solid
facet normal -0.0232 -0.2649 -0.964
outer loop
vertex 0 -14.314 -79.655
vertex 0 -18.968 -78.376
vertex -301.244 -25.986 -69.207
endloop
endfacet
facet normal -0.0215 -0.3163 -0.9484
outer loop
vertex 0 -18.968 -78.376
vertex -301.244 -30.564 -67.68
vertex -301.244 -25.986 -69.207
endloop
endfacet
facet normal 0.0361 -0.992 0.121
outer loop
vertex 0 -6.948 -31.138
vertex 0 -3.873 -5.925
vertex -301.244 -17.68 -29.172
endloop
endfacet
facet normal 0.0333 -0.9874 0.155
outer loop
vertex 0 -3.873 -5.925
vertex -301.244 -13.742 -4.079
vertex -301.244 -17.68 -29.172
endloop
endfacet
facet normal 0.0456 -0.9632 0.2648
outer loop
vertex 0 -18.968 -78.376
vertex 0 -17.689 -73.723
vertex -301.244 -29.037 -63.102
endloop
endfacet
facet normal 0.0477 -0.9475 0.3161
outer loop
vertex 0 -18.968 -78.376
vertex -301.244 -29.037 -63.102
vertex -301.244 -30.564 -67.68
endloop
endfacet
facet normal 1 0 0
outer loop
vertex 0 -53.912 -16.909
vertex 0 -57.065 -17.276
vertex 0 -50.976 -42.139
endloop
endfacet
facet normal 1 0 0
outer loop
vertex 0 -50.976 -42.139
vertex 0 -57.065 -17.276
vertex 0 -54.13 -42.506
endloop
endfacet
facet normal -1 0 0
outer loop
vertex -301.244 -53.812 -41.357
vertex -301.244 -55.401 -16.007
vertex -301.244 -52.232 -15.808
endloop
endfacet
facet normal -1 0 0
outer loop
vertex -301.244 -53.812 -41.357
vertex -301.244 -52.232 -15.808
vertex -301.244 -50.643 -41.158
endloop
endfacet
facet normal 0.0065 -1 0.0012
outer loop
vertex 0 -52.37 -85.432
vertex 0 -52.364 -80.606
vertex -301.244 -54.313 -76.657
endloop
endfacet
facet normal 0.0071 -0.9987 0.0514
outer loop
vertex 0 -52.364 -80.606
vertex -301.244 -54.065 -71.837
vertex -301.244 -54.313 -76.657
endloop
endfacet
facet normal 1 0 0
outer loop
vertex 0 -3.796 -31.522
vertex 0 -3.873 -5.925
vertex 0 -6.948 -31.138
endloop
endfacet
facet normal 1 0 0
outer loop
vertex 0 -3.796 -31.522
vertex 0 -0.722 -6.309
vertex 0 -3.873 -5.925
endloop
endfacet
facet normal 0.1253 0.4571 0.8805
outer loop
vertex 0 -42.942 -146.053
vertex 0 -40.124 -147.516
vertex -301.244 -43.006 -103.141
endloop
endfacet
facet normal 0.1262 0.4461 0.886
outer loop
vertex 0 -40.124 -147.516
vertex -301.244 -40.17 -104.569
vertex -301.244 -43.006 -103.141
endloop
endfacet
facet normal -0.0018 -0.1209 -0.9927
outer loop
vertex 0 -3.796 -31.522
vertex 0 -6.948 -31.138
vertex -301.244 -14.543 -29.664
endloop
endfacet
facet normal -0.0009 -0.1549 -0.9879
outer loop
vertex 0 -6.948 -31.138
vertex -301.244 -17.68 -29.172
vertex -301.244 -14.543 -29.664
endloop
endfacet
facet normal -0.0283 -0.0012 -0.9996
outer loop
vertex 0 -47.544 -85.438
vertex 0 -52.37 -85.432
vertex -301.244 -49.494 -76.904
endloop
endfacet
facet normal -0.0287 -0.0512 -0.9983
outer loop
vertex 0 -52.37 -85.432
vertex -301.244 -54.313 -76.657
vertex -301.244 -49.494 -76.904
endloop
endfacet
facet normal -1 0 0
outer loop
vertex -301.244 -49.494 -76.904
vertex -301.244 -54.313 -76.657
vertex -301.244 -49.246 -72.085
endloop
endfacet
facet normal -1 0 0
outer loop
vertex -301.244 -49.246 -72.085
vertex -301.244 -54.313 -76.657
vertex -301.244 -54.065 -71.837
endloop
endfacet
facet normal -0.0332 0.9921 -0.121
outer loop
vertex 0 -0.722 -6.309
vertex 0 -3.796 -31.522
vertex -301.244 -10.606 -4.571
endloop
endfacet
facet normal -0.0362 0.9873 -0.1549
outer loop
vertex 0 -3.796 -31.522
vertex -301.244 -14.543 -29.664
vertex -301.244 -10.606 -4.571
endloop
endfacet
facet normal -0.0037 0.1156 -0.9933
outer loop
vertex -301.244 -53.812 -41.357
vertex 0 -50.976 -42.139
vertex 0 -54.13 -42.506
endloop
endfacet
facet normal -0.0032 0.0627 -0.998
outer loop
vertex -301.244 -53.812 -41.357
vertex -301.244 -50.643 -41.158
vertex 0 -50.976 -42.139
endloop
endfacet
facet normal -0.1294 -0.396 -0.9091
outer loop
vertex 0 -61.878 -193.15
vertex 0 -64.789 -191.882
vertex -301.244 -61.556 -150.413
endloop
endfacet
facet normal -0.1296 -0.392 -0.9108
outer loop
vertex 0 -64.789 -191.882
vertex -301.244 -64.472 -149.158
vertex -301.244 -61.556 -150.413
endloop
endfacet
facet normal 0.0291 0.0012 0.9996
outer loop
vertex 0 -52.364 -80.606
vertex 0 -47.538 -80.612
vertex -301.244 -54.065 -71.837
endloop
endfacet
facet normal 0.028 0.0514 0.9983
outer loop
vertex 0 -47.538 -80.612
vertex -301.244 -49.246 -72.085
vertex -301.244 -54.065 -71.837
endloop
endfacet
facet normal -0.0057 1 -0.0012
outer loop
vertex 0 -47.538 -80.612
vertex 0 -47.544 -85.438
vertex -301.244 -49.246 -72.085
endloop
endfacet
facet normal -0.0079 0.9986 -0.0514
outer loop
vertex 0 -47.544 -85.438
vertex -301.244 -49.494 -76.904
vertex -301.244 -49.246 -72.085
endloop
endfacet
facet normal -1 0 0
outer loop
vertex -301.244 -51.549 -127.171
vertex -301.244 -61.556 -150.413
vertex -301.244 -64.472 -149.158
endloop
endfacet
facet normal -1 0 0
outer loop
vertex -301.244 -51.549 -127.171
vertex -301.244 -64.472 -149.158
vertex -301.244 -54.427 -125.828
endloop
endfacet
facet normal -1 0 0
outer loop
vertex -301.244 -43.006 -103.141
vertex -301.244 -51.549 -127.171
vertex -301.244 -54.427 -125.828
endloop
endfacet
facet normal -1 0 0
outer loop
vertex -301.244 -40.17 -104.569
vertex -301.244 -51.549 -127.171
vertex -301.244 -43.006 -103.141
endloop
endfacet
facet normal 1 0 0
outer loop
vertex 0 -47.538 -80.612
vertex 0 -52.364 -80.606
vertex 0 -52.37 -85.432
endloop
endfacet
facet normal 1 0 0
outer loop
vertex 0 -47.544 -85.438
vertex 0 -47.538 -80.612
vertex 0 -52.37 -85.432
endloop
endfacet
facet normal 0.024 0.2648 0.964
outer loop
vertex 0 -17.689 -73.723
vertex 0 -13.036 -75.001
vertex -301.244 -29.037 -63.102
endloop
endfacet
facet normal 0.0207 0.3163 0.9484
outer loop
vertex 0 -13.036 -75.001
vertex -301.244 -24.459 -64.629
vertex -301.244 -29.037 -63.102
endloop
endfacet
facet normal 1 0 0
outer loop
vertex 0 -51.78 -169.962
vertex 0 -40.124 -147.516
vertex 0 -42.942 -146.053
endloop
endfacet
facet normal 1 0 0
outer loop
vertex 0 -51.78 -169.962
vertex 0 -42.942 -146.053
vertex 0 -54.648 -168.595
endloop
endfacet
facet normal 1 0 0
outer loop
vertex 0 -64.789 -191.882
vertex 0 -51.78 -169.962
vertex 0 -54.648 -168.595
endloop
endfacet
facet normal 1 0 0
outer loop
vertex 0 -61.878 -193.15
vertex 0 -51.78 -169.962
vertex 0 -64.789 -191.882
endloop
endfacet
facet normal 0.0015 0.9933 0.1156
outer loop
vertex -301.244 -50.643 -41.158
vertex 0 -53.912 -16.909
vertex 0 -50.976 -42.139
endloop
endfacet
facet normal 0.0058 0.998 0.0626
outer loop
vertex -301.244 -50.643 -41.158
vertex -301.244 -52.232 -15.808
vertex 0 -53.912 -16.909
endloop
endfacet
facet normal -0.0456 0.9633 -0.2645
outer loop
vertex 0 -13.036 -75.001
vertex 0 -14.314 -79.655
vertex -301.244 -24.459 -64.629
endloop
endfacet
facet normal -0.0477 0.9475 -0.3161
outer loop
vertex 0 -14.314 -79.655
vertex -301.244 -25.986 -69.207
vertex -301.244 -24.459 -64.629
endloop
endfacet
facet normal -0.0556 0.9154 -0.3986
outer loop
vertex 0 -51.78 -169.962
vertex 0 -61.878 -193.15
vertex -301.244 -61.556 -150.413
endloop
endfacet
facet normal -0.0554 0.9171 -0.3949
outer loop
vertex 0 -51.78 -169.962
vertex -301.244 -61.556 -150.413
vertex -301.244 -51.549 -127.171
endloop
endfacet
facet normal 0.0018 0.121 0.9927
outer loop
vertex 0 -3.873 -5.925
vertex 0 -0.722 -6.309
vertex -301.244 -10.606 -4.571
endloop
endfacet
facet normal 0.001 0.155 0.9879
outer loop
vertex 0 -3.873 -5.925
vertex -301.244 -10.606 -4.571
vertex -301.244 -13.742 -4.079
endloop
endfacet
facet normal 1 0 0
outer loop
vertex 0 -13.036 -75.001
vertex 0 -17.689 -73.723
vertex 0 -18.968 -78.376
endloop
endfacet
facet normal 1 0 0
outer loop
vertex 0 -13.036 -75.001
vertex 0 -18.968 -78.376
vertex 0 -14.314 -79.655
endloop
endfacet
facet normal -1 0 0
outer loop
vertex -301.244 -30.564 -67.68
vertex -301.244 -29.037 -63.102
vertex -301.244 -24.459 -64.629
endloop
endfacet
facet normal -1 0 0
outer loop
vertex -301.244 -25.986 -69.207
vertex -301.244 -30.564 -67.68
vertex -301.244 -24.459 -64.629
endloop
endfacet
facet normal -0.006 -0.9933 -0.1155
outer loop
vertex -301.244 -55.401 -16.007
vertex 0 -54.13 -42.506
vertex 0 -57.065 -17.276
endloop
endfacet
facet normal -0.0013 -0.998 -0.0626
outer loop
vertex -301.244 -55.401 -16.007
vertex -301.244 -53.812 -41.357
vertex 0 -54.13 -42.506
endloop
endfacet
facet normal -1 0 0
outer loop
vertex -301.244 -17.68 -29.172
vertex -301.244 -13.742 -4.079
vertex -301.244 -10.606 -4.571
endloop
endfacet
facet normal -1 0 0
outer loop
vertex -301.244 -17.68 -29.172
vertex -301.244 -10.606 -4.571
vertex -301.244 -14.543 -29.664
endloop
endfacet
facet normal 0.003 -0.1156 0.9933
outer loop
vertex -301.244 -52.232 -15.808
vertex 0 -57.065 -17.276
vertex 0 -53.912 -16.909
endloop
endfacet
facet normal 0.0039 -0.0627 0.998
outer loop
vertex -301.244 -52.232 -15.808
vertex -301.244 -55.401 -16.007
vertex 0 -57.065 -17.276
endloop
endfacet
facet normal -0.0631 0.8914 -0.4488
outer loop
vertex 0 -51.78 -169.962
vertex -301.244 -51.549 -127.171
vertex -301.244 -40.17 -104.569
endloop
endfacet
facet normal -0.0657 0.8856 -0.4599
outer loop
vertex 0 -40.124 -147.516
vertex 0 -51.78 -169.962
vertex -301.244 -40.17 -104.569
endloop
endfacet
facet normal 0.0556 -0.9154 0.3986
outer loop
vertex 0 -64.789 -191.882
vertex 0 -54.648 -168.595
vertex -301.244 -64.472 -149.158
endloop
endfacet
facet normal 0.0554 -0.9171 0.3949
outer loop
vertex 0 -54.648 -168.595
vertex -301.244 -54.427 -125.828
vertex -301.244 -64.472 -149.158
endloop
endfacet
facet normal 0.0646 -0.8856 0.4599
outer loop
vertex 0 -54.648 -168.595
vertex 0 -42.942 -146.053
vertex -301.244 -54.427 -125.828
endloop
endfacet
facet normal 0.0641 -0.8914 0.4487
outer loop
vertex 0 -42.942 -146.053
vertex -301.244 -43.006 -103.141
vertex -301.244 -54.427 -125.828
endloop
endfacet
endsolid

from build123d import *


with BuildPart() as part:
    # Sketch1 → Loft1 section 0
    with BuildSketch(Plane(origin=(0, 0, 0), x_dir=(0, 0, -1), z_dir=(1, 0, 0))):
        Polygon((5.924524399, -3.873191473), (31.13772874, -6.947980383), (31.522077354, -3.79632984), (6.308873012, -0.72154093), align=None)
    # Sketch2 → Loft1 section 1
    with BuildSketch(Plane(origin=(-301.244, 0, 0), x_dir=(0, 0, -1), z_dir=(1, 0, 0))):
        Polygon((29.66416581, -14.543476344), (4.571250508, -10.60576106), (4.079036097, -13.742375473), (29.171951399, -17.680090757), align=None)
    loft()


with BuildPart() as body_2:
    # Sketch1<3> → Loft2 section 0
    with BuildSketch(Plane(origin=(0, 0, 0), x_dir=(0, 0, -1), z_dir=(1, 0, 0))):
        Polygon((73.722592843, -17.689285792), (78.376128634, -18.967910303), (79.654753145, -14.314374511), (75.001217353, -13.035750001), align=None)
    # Sketch2<3> → Loft2 section 1
    with BuildSketch(Plane(origin=(-301.244, 0, 0), x_dir=(0, 0, -1), z_dir=(1, 0, 0))):
        Polygon((67.679850957, -30.564309841), (63.101919005, -29.03695427), (64.629274577, -24.459022317), (69.207206529, -25.986377889), align=None)
    loft()


with BuildPart() as body_3:
    # Sketch1<4> → Loft3 section 0
    with BuildSketch(Plane(origin=(0, 0, 0), x_dir=(0, 0, -1), z_dir=(1, 0, 0))):
        Polygon((146.053031758, -42.941582115), (168.594795862, -54.647515272), (170.058037507, -51.829794759), (147.516273403, -40.123861602), align=None)
    # Sketch2<4> → Loft3 section 1
    with BuildSketch(Plane(origin=(-301.244, 0, 0), x_dir=(0, 0, -1), z_dir=(1, 0, 0))):
        Polygon((125.828368959, -54.427320521), (103.140917658, -43.006306842), (104.568544368, -40.17037543), (127.255995669, -51.591389108), align=None)
    loft()

    # Sketch1<5> → Loft4 section 0
    with BuildSketch(Plane(origin=(0, 0, 0), x_dir=(0, 0, -1), z_dir=(1, 0, 0))):
        Polygon((168.594795862, -54.647515272), (191.882473097, -64.788722746), (193.150124031, -61.877763092), (169.862446797, -51.736555617), align=None)
    # Sketch2<5> → Loft4 section 1
    with BuildSketch(Plane(origin=(-301.244, 0, 0), x_dir=(0, 0, -1), z_dir=(1, 0, 0))):
        Polygon((149.157729545, -64.472266247), (125.828368959, -54.427320521), (127.083987175, -51.511150448), (150.413347761, -61.556096174), align=None)
    loft()


with BuildPart() as body_4:
    # Sketch1<6> → Loft5 section 0
    with BuildSketch(Plane(origin=(0, 0, 0), x_dir=(0, 0, -1), z_dir=(1, 0, 0))):
        Polygon((80.606015408, -52.363936617), (85.432011787, -52.369848162), (85.437923333, -47.543851783), (80.611926953, -47.537940238), align=None)
    # Sketch2<8> → Loft5 section 1
    with BuildSketch(Plane(origin=(-301.244, 0, 0), x_dir=(0, 0, -1), z_dir=(1, 0, 0))):
        Polygon((76.656597753, -54.31319682), (71.836959606, -54.065478974), (72.084677452, -49.245840827), (76.904315599, -49.493558673), align=None)
    loft()


with BuildPart() as body_5:
    # Sketch1<7> → Loft6 section 0
    with BuildSketch(Plane(origin=(0, 0, 0), x_dir=(0, 0, -1), z_dir=(1, 0, 0))):
        Polygon((17.276227552, -57.065250581), (16.90927633, -53.911527099), (42.139064186, -50.975917325), (42.506015408, -54.129640807), align=None)
    # Sketch2<7> → Loft6 section 1
    with BuildSketch(Plane(origin=(-301.244, 0, 0), x_dir=(0, 0, -1), z_dir=(1, 0, 0))):
        Polygon((41.356959606, -53.811683647), (16.006708373, -55.400633756), (15.80808961, -52.231852352), (41.158340842, -50.642902243), align=None)
    loft()


solid = Compound([part.part, body_2.part, body_3.part, body_4.part, body_5.part])
